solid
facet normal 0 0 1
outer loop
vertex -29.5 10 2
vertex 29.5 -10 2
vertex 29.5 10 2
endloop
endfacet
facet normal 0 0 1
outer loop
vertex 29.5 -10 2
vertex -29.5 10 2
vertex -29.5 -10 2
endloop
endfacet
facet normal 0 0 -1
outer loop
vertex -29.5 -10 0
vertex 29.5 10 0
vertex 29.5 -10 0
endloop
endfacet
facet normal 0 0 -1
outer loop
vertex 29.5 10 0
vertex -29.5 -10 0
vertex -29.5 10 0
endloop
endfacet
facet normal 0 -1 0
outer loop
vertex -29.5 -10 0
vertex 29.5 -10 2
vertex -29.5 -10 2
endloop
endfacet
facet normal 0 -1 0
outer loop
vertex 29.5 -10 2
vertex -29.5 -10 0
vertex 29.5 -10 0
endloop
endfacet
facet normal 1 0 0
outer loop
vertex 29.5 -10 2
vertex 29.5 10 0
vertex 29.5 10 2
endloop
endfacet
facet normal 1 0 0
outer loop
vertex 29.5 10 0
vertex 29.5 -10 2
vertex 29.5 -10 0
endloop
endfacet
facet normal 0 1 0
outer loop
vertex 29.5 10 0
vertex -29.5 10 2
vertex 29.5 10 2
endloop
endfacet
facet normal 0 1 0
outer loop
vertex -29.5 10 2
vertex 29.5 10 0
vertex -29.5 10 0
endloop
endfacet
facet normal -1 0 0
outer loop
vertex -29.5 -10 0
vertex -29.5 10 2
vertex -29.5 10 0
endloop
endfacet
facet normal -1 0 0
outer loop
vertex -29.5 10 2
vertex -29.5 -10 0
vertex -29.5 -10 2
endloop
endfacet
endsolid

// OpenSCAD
// file: variables.scad
confetti_w = 55;
confetti_h = 16;

margin = 4;

plate_w = confetti_w + margin;
plate_h = confetti_h + margin;

thickness = 2;
// main file
include <variables.scad>

translate([0, 0, thickness/2]) cube([plate_w, plate_h, thickness], center=true);
